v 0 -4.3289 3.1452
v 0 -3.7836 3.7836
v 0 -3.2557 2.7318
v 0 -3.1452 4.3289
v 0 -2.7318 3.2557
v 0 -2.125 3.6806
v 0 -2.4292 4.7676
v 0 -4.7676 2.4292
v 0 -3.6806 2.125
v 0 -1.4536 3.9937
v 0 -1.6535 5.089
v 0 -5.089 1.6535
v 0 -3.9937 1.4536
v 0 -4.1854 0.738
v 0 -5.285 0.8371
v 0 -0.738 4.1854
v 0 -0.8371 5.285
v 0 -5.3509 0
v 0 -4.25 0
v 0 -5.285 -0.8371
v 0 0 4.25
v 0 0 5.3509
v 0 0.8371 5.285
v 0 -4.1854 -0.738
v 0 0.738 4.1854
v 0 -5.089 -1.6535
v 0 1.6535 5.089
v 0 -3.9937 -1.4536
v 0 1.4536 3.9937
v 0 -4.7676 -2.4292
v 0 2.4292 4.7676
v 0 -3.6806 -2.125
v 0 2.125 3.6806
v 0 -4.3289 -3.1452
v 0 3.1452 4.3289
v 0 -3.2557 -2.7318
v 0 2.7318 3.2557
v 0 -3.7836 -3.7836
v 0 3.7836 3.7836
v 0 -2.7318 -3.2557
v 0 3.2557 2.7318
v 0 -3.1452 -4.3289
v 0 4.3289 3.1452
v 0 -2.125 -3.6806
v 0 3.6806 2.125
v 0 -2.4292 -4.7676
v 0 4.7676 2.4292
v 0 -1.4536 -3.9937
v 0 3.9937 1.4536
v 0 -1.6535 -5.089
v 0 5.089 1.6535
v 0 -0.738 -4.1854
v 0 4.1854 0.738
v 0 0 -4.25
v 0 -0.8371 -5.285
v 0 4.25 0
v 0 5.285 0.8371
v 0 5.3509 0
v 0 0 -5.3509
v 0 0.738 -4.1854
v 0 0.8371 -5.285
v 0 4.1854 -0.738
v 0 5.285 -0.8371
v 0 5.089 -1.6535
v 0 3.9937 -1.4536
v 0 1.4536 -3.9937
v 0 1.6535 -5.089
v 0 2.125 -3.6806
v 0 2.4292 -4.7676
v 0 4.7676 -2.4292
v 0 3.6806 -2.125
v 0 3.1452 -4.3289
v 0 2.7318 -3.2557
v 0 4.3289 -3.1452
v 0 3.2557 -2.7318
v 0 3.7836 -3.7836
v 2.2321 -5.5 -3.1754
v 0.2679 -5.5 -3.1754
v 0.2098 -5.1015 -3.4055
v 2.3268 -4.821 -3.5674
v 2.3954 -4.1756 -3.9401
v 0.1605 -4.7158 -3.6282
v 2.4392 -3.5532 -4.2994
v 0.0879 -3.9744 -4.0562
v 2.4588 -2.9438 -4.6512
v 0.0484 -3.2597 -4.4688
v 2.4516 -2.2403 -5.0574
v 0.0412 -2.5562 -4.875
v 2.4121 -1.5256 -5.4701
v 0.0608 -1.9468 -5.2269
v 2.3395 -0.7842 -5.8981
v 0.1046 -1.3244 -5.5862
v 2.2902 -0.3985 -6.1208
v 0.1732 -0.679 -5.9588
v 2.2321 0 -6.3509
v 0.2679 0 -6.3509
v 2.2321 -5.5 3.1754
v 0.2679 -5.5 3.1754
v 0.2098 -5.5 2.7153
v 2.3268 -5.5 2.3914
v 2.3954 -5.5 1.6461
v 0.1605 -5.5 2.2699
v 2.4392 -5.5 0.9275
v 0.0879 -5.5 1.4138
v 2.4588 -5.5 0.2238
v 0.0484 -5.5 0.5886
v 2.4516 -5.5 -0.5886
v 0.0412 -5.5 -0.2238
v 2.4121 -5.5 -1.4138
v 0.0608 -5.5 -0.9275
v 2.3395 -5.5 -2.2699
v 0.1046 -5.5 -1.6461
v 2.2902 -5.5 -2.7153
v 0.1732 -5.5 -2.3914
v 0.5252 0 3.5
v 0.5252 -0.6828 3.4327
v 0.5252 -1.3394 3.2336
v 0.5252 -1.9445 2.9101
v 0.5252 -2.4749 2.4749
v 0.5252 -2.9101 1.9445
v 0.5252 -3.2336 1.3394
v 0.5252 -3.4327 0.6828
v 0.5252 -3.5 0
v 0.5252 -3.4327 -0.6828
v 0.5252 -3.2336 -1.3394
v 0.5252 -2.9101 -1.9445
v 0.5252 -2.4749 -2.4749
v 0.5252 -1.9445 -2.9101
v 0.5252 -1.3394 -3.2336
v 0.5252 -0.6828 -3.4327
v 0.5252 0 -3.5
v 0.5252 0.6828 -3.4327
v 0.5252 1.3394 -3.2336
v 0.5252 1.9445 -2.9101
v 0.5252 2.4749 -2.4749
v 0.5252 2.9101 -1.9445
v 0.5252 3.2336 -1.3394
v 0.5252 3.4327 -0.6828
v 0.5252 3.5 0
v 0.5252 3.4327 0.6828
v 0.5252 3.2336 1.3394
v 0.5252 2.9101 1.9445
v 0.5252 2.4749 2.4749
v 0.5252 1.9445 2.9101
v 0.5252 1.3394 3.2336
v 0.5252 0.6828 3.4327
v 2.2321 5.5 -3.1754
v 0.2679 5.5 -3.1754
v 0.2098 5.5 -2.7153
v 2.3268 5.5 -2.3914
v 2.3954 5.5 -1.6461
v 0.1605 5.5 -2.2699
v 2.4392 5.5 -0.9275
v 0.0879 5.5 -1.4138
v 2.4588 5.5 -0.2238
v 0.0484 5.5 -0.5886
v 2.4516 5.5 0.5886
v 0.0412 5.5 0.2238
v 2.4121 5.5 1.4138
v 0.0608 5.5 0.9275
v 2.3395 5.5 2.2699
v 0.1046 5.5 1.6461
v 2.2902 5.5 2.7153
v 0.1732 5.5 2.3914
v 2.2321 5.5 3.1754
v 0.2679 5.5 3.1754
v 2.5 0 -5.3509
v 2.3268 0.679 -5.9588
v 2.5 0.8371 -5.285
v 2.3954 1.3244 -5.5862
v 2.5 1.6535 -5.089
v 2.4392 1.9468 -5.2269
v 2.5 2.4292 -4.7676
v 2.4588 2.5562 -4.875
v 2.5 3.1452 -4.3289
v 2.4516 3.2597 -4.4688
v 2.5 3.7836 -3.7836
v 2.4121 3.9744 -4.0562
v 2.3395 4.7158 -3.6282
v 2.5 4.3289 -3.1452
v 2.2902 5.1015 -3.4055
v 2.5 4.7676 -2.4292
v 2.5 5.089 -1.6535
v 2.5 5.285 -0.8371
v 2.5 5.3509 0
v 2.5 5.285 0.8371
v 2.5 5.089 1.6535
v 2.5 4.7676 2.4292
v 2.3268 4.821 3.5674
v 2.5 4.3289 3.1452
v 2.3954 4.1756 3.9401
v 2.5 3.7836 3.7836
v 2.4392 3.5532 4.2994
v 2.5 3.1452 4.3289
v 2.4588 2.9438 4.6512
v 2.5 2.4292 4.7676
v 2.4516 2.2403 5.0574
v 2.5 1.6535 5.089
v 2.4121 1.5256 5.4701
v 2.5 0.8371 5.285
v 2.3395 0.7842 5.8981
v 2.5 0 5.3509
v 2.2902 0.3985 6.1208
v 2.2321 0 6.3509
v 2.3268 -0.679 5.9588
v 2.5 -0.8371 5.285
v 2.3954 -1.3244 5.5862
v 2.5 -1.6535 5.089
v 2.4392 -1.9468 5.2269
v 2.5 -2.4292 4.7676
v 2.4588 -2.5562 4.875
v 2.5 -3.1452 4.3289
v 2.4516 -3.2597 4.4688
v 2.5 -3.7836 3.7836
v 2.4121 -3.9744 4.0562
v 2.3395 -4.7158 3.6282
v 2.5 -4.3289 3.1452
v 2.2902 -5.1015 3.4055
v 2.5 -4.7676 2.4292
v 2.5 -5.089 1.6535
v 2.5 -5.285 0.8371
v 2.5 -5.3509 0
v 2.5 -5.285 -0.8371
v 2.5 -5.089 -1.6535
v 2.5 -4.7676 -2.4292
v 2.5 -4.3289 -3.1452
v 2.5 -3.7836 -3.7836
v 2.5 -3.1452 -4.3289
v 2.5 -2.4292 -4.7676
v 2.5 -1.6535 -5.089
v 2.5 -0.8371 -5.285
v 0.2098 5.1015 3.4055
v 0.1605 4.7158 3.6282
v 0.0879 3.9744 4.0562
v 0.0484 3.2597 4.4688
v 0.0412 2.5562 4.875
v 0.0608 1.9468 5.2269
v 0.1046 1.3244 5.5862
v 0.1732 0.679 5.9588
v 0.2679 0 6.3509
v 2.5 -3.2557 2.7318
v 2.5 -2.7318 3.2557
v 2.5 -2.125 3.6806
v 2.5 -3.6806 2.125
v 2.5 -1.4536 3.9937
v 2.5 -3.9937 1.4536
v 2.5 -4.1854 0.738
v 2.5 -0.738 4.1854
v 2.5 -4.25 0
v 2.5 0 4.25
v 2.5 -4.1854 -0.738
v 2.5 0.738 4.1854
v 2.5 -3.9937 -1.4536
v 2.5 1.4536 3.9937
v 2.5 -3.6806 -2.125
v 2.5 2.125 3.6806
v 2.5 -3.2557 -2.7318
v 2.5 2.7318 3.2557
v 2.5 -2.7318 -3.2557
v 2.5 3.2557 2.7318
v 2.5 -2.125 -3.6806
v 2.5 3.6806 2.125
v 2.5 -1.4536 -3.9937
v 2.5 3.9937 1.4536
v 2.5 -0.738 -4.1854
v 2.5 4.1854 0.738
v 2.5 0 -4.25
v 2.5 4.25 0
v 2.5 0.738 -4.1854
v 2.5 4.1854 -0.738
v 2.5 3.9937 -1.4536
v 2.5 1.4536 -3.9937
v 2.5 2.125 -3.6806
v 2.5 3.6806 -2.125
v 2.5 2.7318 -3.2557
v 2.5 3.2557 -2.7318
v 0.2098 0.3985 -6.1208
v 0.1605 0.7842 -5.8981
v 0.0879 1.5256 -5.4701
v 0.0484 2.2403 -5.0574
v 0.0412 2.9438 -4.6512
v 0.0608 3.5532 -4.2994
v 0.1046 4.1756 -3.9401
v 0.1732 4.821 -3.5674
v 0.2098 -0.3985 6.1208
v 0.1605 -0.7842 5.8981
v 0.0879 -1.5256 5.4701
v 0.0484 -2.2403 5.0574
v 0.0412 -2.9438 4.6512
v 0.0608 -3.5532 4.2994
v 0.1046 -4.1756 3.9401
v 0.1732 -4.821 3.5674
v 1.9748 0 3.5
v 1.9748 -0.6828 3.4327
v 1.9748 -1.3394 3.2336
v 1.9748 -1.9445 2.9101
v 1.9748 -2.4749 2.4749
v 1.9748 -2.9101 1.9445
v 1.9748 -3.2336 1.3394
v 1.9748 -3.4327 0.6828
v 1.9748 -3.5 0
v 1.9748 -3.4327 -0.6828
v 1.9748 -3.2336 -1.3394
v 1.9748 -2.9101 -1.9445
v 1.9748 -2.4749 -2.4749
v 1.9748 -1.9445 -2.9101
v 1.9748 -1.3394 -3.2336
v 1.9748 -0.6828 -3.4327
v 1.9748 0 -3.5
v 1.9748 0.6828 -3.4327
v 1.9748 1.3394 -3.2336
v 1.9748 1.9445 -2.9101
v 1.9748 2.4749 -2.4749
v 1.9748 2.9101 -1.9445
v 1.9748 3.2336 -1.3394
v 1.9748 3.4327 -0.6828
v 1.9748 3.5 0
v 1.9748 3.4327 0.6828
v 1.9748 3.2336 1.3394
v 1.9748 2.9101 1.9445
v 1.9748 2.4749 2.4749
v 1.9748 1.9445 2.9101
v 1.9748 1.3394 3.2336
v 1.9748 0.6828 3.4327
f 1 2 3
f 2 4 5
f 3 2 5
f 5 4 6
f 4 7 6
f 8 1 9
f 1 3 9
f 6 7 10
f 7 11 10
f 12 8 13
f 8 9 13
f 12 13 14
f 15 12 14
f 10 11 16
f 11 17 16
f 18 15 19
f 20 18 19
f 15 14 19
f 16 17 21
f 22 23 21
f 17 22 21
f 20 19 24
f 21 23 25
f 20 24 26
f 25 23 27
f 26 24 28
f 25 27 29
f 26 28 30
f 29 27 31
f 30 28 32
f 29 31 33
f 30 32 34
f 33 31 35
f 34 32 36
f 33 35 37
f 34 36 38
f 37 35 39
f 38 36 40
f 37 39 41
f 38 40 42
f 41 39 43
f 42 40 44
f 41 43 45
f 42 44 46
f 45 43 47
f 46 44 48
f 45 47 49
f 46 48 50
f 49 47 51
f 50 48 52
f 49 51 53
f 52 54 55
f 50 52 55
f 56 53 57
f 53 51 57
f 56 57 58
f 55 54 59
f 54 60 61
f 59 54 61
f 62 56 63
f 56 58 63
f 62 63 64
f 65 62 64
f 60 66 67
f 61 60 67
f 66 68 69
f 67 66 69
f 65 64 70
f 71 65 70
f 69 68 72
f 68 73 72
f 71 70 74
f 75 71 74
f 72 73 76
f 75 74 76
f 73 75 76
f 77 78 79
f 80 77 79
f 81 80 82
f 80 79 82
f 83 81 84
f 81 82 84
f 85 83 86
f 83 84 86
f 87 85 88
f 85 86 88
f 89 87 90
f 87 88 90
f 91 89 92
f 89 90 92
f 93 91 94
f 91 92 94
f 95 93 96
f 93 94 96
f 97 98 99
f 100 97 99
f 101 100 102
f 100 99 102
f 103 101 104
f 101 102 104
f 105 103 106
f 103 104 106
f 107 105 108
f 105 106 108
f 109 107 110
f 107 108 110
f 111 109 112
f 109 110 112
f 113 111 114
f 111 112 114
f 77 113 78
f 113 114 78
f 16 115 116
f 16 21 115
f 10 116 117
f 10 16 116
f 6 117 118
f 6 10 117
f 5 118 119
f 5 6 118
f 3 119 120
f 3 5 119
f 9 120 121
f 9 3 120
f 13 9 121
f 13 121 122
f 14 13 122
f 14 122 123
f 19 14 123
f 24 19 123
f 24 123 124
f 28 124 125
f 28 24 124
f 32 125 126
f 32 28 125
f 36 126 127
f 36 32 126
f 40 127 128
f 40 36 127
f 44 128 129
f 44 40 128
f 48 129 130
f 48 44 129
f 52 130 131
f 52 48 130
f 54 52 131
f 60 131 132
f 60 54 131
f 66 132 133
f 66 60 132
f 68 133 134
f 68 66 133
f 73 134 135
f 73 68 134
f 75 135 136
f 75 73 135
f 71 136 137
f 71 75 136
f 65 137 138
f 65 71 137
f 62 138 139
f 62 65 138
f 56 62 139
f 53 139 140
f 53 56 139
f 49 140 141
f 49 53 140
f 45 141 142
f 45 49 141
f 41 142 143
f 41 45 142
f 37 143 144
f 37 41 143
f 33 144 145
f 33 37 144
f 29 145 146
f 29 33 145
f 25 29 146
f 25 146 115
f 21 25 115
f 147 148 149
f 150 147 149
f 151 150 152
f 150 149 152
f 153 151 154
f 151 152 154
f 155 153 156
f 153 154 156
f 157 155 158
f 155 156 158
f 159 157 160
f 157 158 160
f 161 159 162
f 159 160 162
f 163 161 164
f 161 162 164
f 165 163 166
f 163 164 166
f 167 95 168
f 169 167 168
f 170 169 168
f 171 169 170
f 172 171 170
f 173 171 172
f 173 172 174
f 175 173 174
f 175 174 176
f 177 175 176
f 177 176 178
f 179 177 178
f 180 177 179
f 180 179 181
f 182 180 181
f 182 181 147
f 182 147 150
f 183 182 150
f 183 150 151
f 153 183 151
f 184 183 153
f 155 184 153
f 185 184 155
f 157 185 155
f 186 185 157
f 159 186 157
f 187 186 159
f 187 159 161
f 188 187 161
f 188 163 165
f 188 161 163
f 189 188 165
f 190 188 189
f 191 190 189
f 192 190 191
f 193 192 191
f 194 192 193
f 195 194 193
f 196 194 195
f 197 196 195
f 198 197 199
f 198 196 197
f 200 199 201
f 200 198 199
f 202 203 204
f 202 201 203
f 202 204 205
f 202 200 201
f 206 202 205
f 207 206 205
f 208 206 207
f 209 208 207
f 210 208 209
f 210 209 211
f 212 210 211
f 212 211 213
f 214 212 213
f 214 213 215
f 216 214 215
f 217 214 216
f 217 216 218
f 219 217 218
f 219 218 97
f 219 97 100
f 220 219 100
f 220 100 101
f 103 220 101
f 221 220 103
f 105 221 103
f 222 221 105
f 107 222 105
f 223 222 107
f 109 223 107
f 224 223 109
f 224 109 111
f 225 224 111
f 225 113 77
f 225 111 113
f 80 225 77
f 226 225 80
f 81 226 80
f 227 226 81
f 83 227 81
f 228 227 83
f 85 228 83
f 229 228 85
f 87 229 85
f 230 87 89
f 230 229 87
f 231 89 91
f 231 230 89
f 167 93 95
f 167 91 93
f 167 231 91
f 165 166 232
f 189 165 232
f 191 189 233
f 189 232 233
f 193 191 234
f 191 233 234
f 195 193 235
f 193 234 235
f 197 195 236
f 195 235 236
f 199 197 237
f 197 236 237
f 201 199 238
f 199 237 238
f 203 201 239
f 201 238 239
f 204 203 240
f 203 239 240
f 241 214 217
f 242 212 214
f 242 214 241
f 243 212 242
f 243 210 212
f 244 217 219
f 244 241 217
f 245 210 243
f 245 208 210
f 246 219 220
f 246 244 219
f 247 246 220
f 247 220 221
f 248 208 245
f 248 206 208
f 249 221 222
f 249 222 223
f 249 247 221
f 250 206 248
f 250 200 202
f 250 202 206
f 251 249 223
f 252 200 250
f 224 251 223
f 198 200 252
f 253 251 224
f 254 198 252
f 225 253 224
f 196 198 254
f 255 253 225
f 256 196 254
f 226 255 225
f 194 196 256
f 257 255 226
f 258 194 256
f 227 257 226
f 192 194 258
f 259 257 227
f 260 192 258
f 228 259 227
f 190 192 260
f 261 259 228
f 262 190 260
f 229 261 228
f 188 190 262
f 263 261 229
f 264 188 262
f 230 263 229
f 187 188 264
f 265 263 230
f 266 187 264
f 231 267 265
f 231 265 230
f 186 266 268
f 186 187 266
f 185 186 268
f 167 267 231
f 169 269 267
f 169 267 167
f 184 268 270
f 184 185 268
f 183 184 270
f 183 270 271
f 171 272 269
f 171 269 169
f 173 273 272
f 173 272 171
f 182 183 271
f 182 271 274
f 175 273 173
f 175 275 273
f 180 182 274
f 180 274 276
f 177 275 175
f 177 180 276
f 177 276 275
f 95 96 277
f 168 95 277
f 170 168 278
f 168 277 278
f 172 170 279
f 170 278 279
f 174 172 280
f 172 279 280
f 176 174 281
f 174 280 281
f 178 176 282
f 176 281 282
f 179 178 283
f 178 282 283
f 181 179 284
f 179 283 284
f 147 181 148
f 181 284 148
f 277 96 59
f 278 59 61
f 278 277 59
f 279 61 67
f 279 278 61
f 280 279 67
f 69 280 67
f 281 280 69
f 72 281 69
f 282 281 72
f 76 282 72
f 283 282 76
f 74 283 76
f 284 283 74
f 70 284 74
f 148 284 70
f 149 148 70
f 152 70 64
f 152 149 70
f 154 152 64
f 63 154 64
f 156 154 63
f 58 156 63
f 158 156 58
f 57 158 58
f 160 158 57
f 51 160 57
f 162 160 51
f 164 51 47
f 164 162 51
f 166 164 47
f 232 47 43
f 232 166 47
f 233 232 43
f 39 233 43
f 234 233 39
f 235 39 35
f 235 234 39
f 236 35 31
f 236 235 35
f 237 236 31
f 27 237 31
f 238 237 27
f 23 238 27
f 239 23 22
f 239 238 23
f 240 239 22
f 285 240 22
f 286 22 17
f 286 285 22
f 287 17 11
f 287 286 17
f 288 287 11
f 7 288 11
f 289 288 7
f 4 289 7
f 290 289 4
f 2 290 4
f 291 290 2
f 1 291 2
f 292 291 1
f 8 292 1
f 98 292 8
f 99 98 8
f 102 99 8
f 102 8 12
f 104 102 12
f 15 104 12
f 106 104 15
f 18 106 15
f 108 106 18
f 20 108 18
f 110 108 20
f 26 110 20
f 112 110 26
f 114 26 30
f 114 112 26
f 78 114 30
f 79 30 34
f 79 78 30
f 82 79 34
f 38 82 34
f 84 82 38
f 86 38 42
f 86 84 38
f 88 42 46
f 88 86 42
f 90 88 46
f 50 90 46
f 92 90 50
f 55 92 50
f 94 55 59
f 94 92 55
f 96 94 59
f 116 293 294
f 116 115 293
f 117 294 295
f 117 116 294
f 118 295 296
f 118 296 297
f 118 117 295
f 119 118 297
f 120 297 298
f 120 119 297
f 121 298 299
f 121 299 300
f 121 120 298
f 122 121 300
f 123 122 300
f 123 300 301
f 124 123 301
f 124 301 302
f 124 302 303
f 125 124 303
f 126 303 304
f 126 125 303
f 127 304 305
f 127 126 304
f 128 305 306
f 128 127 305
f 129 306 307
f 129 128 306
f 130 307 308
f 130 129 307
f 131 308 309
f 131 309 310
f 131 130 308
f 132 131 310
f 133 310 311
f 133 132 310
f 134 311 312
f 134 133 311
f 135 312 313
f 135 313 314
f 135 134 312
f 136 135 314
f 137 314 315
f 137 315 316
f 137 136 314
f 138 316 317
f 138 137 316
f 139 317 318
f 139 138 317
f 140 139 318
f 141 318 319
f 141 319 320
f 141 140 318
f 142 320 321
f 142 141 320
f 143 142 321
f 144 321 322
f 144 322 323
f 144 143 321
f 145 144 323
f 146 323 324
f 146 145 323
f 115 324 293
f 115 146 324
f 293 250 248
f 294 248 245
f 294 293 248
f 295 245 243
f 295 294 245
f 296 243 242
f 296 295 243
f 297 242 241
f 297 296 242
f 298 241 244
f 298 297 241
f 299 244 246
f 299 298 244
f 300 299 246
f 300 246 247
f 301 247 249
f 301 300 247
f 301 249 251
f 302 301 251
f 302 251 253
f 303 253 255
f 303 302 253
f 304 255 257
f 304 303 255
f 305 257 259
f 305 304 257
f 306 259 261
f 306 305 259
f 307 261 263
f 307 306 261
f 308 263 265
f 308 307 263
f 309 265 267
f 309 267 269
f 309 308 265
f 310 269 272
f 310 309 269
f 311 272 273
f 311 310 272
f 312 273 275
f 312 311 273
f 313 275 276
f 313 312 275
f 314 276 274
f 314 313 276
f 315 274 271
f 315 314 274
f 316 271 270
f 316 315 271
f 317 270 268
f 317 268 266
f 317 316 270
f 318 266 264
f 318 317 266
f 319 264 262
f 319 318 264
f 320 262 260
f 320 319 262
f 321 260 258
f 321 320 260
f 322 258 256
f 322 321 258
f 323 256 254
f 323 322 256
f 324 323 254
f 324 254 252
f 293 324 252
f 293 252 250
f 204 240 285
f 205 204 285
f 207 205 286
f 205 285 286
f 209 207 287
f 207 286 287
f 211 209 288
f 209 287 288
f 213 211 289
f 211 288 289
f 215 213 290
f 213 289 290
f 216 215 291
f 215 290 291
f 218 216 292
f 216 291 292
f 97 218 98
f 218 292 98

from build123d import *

# Parameters (mm, degrees)
EXTRUDE_1_DEPTH = 2.5


with BuildPart() as part:
    # Эскиз1 → Бобышка-Вытянуть1 (new body)
    with BuildSketch(Plane(origin=(0, 0, 0), x_dir=(0, 0, -1), z_dir=(1, 0, 0))):
        Polygon((6.350852961, 0), (3.175426481, 5.5), (-3.175426481, 5.5), (-6.350852961, 0), (-3.175426481, -5.5), (3.175426481, -5.5), align=None)
    extrude(amount=EXTRUDE_1_DEPTH)

    # Эскиз2 → Вырез-Повернуть1 (revolve, cut)
    with BuildSketch(Plane(origin=(0, 0, 0), x_dir=(1, 0, 0), z_dir=(0, 1, 0))):
        Polygon((0, 5.350852961), (0.267949192, 6.350852961), (2.232050808, 6.350852961), (2.5, 5.350852961), (4.577096119, 5.350852961), (4.577096119, 7.799096081), (-1.908033153, 7.799096081), (-1.908033153, 5.350852961), align=None)
    revolve(axis=Axis((0, 0, 0), (1, 0, 0)), mode=Mode.SUBTRACT)

    # Эскиз3 → Отверстие обработанное метчиком M8x1.01 (revolve, cut)
    with BuildSketch(Plane.ZX):
        Polygon((0, 0), (0, 2.5), (4.25, 2.5), (3.5, 1.974844346), (3.5, 0.525155654), (4.25, 0), align=None)
    revolve(axis=Axis((-6.35, 0, 0), (1, 0, 0)), mode=Mode.SUBTRACT)


solid = part.part
